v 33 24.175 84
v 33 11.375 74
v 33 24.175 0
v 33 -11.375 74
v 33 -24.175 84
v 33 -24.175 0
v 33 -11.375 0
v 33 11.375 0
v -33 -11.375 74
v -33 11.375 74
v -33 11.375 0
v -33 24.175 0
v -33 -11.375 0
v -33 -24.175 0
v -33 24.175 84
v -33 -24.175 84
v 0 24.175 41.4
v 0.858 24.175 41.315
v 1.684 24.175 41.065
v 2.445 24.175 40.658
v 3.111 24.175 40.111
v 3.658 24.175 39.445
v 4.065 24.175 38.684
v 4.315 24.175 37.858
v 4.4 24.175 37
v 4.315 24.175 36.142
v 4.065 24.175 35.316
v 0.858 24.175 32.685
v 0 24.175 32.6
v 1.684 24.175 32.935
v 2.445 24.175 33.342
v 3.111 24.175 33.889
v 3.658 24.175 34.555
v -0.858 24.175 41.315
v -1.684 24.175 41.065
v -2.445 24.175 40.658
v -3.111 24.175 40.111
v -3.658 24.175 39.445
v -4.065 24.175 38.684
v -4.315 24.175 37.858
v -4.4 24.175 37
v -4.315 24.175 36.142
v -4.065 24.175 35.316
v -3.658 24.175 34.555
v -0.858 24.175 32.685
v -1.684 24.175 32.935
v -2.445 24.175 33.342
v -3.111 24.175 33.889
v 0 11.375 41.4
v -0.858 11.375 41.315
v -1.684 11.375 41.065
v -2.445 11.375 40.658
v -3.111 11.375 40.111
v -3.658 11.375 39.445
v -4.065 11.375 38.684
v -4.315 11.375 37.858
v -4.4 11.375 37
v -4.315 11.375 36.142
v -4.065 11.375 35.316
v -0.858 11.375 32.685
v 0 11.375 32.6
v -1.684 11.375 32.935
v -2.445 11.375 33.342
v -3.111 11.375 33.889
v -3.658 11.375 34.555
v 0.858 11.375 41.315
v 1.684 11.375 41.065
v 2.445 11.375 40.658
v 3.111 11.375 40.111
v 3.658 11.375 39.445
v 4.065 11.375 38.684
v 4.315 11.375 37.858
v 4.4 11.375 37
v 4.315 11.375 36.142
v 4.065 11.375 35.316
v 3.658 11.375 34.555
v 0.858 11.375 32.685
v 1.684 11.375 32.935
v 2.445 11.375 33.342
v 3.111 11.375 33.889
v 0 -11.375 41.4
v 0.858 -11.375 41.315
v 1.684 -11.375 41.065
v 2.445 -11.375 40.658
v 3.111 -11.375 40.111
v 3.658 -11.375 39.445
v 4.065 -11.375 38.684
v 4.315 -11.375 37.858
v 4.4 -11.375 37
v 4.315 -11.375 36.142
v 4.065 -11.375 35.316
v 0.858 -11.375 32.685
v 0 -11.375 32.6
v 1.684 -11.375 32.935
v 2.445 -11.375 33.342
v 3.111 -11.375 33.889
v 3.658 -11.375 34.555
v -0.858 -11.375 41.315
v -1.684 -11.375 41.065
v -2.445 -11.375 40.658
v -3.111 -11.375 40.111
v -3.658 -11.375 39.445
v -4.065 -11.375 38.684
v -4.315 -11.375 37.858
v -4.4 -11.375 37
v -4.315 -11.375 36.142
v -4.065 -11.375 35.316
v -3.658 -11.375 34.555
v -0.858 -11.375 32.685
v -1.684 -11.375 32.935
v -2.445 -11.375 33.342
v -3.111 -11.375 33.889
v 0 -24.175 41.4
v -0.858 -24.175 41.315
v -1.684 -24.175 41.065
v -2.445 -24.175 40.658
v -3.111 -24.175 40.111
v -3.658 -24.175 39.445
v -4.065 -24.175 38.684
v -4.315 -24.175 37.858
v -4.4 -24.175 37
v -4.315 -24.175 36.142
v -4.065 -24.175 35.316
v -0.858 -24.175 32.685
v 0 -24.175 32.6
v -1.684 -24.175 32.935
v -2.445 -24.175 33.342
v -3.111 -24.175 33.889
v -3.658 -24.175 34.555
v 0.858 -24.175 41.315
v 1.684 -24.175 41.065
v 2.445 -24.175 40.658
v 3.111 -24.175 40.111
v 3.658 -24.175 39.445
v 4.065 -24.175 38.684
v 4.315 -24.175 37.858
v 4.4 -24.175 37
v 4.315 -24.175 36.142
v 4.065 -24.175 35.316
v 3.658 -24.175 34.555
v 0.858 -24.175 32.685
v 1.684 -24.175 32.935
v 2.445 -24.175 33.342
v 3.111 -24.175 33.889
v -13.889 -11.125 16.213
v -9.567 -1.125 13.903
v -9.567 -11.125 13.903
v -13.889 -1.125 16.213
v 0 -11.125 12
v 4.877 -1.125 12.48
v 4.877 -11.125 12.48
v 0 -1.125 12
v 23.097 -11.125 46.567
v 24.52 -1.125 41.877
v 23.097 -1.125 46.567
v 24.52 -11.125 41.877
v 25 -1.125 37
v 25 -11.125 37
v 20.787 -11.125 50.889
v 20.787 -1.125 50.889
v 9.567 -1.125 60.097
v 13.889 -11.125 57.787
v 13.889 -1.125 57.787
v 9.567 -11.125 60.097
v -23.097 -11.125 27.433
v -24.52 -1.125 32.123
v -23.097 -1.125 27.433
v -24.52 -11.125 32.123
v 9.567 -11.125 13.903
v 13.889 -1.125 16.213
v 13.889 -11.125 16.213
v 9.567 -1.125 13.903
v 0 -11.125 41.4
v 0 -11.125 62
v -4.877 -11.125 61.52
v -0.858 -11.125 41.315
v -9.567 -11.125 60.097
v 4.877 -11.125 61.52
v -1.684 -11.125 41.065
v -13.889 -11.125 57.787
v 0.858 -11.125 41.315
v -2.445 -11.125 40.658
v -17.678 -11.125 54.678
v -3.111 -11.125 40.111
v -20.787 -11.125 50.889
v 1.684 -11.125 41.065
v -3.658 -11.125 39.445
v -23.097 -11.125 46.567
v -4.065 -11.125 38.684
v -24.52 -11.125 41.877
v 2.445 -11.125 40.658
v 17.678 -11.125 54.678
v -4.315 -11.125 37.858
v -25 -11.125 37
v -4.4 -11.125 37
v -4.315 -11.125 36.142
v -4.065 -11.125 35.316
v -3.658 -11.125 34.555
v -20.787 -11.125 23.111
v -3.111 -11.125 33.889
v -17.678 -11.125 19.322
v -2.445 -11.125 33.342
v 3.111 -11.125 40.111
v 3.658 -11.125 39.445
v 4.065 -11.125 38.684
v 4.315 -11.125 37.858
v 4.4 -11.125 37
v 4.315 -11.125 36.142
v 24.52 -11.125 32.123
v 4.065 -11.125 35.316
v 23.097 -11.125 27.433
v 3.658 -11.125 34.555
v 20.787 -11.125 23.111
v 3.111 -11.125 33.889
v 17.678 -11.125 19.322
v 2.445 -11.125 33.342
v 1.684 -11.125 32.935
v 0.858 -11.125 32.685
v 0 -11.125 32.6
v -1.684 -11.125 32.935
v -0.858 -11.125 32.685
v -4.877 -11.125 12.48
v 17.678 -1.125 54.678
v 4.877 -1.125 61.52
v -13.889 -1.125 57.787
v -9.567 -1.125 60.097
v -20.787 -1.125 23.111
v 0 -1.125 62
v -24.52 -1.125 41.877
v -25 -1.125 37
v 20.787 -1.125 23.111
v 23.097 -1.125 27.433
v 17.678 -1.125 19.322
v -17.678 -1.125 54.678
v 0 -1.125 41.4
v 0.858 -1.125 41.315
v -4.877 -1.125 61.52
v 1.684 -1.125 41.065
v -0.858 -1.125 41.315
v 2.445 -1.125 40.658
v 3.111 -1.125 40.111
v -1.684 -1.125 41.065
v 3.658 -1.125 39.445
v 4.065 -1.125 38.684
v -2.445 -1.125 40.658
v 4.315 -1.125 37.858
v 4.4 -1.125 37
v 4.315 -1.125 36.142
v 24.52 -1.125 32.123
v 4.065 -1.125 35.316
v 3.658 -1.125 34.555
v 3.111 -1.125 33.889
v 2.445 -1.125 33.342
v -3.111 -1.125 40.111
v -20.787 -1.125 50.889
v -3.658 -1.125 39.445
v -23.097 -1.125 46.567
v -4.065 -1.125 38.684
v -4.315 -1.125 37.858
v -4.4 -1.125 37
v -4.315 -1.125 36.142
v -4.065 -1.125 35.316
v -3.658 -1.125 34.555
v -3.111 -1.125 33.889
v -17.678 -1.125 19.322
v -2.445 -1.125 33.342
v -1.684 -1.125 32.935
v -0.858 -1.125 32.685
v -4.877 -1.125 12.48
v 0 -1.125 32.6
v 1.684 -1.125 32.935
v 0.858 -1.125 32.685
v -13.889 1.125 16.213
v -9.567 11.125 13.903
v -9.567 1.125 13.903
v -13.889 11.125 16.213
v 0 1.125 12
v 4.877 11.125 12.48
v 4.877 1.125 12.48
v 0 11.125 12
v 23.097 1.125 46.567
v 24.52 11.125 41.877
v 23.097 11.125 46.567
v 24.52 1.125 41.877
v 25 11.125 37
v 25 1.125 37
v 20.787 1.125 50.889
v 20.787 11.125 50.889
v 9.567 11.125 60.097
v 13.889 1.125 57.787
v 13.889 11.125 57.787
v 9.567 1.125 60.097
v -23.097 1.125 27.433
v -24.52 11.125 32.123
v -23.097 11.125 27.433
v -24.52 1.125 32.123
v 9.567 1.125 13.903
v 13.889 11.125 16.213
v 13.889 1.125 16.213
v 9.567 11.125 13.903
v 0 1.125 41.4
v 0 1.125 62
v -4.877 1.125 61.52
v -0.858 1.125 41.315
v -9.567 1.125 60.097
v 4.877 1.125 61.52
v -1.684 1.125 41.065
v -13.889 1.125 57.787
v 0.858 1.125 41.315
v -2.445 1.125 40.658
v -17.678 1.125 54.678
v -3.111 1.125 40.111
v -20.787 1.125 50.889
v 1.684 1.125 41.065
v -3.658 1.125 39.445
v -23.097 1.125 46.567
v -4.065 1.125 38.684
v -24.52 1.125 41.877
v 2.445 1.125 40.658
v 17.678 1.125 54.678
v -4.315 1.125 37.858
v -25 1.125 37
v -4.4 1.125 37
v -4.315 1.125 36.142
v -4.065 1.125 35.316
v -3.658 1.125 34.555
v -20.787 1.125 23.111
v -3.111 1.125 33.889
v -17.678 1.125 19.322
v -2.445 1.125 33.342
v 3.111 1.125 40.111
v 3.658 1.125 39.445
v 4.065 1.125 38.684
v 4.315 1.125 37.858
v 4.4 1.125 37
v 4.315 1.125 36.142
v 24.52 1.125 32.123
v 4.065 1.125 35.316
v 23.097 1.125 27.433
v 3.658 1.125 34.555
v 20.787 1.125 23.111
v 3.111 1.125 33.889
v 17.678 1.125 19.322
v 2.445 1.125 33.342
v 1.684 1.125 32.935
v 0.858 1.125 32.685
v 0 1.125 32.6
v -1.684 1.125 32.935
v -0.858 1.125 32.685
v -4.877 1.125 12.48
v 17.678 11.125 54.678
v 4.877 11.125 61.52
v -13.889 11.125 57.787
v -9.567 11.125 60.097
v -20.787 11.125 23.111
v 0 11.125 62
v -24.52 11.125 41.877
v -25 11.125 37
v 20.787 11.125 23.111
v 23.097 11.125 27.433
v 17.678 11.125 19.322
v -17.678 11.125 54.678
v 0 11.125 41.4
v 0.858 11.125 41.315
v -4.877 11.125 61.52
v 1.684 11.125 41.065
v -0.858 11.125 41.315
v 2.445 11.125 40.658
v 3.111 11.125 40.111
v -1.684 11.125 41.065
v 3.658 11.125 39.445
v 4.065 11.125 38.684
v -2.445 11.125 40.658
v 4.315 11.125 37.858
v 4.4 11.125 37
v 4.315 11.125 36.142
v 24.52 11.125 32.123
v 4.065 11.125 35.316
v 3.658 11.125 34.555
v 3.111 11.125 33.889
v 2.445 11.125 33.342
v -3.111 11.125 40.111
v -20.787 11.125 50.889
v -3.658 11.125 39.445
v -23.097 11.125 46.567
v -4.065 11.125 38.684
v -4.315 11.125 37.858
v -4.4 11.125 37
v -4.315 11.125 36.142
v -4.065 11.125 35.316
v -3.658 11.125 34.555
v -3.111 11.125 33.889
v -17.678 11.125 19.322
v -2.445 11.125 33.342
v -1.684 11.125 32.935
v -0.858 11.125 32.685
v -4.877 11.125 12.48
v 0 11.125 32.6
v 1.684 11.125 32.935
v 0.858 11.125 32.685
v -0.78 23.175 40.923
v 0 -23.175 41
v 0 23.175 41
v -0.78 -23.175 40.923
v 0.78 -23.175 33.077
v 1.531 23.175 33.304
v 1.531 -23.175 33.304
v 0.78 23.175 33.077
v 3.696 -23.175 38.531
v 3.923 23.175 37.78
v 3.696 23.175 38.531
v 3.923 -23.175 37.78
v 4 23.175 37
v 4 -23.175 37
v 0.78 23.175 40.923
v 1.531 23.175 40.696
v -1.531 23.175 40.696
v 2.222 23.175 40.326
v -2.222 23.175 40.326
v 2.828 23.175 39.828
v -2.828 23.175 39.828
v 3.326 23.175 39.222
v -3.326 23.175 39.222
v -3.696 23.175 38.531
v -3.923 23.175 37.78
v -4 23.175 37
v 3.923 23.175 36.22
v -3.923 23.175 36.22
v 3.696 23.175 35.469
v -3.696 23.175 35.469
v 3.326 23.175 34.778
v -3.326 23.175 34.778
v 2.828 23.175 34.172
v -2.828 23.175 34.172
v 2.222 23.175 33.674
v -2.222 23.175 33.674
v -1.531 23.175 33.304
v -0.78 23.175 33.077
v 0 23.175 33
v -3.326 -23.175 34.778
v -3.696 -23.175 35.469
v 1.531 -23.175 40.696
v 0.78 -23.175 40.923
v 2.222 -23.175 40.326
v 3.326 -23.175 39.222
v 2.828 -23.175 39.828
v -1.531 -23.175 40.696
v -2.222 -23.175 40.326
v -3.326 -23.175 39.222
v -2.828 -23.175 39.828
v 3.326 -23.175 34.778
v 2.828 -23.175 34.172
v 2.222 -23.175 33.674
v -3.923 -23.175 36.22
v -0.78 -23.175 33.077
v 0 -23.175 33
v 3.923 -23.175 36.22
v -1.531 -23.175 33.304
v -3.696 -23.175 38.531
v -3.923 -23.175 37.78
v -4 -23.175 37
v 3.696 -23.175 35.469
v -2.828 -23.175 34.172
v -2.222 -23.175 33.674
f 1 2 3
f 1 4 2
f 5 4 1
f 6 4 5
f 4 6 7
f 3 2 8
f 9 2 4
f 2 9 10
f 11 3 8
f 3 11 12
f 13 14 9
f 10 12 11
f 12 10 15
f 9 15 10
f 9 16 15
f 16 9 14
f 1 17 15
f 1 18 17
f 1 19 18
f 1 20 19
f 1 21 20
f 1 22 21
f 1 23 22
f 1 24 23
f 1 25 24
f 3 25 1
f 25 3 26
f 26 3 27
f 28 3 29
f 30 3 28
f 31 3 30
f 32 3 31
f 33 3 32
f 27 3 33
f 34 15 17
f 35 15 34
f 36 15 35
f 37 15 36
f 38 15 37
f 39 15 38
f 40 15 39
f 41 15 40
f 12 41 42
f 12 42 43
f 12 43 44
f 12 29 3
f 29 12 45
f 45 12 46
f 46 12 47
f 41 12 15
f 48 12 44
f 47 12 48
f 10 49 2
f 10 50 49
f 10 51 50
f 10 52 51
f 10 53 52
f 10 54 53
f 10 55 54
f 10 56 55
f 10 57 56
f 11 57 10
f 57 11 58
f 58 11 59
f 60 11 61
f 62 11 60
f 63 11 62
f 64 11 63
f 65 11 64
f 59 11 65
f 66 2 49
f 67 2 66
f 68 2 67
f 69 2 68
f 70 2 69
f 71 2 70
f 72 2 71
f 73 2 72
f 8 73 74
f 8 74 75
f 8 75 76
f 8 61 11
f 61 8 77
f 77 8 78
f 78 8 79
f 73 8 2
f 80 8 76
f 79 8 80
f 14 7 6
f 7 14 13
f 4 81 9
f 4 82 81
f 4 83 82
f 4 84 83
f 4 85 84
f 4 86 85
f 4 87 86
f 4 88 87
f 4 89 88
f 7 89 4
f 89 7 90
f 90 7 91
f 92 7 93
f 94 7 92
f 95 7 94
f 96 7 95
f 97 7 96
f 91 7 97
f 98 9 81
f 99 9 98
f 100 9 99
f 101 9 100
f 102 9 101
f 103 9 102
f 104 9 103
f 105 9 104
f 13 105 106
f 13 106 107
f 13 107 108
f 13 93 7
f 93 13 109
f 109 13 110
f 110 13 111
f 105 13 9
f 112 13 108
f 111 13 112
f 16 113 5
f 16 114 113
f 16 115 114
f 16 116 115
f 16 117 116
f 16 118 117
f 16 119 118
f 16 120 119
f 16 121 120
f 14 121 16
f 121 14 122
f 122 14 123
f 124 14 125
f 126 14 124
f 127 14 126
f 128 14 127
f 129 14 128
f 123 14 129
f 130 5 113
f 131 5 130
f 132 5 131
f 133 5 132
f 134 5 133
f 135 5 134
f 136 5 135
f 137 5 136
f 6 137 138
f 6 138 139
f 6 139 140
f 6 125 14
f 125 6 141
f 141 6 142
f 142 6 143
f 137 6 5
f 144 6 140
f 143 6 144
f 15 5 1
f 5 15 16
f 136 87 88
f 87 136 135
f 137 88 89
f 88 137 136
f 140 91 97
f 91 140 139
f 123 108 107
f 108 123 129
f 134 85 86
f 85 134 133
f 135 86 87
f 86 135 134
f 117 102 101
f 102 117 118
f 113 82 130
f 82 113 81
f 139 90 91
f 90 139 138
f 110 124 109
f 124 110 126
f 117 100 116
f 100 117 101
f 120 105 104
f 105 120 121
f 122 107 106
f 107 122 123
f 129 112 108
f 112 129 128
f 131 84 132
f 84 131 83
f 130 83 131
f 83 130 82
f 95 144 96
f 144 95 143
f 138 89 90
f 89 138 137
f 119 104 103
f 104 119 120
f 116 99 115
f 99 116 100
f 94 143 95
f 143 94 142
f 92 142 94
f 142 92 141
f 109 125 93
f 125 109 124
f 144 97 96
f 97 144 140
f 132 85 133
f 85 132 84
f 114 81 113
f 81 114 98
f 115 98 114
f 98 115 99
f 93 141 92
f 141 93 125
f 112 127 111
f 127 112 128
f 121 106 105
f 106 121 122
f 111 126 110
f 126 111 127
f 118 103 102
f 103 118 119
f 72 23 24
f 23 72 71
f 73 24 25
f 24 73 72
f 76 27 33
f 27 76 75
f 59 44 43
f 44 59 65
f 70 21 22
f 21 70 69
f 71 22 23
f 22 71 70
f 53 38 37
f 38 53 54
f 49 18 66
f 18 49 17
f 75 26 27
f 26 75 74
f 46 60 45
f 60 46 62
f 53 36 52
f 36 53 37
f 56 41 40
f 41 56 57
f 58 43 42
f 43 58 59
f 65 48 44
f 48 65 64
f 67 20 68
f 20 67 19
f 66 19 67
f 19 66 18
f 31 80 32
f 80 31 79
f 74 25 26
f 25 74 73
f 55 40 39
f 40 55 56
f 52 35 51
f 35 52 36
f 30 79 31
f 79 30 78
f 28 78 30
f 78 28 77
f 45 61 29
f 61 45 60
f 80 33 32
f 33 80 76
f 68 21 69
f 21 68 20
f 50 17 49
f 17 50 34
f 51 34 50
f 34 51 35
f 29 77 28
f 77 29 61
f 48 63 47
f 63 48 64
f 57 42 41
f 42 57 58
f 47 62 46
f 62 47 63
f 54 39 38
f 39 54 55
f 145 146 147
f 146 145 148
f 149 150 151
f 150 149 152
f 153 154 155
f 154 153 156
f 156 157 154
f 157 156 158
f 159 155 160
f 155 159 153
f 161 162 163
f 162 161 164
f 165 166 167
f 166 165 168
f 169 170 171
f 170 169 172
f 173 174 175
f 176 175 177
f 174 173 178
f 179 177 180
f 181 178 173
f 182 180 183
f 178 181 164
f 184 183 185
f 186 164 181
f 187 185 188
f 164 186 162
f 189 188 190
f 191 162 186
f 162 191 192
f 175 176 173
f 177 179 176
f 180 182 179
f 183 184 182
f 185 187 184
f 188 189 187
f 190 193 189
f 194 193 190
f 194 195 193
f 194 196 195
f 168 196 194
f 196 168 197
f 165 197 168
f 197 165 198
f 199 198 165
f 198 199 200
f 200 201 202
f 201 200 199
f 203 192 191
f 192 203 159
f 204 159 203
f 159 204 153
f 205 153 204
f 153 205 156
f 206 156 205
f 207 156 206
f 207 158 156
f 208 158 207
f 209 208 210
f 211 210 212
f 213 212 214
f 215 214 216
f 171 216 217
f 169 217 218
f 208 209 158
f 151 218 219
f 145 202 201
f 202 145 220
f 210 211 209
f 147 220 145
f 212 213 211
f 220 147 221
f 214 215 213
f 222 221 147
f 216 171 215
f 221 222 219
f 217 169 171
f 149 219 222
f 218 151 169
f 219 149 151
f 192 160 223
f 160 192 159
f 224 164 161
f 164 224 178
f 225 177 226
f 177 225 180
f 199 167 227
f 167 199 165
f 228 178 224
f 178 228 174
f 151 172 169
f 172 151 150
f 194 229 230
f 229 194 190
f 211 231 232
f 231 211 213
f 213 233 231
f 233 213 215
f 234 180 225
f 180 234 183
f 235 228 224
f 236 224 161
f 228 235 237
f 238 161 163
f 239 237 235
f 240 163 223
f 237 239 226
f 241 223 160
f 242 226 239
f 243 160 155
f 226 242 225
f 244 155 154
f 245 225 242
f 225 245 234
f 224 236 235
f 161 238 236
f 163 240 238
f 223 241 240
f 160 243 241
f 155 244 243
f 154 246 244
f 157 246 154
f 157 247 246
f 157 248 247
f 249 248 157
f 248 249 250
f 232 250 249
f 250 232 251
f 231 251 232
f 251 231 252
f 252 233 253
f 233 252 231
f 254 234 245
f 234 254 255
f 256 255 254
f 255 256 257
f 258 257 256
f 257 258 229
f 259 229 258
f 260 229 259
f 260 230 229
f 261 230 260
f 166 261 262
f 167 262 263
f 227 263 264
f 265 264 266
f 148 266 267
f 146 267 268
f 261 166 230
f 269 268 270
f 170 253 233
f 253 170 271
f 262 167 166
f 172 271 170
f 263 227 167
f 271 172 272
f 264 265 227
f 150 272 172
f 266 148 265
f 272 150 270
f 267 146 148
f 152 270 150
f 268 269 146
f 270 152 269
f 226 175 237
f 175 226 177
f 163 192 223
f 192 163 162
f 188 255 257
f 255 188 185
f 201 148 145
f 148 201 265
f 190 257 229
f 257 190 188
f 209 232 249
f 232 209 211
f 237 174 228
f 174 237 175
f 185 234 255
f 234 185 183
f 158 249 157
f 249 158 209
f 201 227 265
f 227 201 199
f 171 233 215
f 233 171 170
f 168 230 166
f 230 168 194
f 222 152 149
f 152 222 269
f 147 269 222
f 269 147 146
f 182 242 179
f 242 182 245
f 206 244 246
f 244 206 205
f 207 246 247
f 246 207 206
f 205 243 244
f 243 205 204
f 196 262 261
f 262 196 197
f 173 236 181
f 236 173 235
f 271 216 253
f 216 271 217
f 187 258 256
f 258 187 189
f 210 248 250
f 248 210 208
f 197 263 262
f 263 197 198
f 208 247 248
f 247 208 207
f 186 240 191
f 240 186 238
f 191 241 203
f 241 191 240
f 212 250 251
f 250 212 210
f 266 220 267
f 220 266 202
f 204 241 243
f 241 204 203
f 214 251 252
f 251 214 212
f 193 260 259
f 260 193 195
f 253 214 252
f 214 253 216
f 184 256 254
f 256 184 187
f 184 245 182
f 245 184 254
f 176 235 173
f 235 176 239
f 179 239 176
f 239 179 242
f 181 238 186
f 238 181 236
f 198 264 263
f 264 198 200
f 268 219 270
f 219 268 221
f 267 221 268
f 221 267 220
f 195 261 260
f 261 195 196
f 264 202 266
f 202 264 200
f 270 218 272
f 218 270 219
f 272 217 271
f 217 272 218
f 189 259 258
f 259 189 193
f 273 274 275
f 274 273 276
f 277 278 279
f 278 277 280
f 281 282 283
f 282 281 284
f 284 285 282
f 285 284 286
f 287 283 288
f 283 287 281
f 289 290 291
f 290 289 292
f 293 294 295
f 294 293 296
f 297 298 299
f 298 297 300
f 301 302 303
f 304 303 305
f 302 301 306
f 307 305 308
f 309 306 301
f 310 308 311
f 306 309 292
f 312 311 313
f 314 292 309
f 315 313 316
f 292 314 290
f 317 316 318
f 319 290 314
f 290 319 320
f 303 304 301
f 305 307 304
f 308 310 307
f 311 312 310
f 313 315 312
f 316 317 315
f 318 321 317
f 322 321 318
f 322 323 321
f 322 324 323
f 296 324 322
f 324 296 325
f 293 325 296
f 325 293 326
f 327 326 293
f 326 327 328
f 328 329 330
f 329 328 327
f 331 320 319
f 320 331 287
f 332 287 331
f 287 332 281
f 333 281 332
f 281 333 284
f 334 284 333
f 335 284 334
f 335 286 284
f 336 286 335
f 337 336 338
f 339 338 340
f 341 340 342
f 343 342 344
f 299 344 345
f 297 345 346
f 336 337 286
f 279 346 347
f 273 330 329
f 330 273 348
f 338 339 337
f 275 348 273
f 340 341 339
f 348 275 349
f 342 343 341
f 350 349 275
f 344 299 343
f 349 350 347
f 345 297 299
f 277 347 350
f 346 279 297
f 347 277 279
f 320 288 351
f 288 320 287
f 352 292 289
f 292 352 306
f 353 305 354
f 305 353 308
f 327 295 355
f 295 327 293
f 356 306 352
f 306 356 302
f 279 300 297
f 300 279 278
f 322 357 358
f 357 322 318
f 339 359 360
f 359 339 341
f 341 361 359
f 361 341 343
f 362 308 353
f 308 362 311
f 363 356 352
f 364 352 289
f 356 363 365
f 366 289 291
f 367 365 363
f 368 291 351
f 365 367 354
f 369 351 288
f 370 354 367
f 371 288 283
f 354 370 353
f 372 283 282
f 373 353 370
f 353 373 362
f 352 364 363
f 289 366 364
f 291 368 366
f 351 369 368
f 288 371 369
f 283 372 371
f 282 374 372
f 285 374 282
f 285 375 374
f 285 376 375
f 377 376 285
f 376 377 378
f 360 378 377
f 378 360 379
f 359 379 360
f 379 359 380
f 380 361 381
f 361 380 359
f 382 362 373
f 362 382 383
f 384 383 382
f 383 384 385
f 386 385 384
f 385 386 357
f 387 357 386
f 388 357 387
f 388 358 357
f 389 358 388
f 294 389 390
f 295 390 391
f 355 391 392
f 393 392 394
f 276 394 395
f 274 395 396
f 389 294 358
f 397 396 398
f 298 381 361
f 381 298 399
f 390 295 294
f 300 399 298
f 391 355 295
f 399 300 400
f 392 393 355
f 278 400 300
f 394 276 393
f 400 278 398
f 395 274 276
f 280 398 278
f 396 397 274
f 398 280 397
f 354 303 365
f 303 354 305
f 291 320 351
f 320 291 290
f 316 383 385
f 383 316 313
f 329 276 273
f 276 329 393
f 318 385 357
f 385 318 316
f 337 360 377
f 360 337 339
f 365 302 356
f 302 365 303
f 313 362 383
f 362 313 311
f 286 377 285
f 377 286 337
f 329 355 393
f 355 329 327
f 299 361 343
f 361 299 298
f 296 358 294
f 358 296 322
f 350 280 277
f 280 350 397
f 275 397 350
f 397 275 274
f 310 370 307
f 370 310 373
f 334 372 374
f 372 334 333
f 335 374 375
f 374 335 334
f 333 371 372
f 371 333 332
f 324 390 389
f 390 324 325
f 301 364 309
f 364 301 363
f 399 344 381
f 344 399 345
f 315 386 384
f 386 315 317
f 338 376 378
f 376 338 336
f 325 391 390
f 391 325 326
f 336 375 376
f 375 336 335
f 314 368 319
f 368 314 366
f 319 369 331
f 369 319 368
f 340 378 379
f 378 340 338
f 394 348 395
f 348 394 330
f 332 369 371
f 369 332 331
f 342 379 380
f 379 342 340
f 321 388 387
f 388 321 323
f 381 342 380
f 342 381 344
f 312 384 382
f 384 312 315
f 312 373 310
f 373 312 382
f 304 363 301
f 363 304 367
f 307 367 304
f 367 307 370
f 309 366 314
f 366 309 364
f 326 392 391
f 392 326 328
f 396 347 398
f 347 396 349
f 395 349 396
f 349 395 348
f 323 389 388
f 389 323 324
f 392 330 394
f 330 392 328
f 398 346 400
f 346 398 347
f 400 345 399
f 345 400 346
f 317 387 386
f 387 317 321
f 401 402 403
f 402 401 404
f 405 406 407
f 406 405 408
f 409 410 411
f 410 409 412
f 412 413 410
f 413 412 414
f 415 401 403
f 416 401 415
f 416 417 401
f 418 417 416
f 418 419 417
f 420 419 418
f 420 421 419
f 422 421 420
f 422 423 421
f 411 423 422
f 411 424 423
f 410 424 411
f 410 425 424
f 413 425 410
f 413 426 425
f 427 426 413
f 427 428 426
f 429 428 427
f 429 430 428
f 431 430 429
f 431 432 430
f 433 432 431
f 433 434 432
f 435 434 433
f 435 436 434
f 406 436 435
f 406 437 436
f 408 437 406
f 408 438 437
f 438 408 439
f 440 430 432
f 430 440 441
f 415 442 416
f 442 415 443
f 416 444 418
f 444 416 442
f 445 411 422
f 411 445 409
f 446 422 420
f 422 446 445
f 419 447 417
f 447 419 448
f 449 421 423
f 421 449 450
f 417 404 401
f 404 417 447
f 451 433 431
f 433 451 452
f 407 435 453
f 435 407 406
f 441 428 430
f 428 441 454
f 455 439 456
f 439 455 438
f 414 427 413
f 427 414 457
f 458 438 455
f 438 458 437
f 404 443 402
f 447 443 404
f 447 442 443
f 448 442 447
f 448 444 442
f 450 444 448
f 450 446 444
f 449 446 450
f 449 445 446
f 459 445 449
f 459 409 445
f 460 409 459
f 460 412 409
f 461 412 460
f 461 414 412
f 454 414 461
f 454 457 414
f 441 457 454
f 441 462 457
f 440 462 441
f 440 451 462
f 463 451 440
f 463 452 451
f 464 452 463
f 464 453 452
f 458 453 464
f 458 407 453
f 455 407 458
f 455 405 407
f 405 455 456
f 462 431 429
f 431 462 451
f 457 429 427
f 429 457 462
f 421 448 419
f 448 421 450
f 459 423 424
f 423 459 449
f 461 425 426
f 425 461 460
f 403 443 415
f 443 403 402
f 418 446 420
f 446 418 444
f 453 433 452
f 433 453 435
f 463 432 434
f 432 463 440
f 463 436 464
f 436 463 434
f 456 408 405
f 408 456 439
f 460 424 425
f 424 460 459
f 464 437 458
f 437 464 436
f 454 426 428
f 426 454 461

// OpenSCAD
$fn = 32;

// ------------------------------------------------------------------------
// Trolley wheel set: wheels d50, fork 74 mm tall
// Every part is its own module, assembly() places every instance.
// ------------------------------------------------------------------------

// --- part 1 ---
module trolley_fork() {
  difference() {
    union() {
      translate([-33, 11.375, 0]) cube([66, 12.8, 74]);
      translate([-33, -24.175, 0]) cube([66, 12.8, 74]);
      translate([-33, -24.175, 74]) cube([66, 48.35, 10]);
    }
    translate([0, -17.775, 37]) rotate([90, 0, 0]) cylinder(h = 14.8, d = 8.8, center = true);
    translate([0, 17.775, 37]) rotate([90, 0, 0]) cylinder(h = 14.8, d = 8.8, center = true);
  }
}

// --- part 2 ---
module trolley_wheel() {
  difference() {
      translate([0, 0, 0]) cylinder(h = 10, d = 50);
      translate([0, 0, -1]) cylinder(h = 12, d = 8.8);
    }
}

// --- part 3 ---
module trolley_axle() {
  translate([0, 0, -23.175]) cylinder(h = 46.35, d = 8);
}

// --- assembly ---
module assembly() {
  color([0.80, 0.24, 0.20]) translate([0, 0, 0]) rotate([0, 0, 0]) trolley_fork();
  color([0.20, 0.45, 0.75]) translate([0, -1.125, 37]) rotate([90, 0, 0]) trolley_wheel();
  color([0.25, 0.62, 0.32]) translate([0, 11.125, 37]) rotate([90, 0, 0]) trolley_wheel();
  color([0.92, 0.70, 0.18]) translate([0, 0, 37]) rotate([90, 0, 0]) trolley_axle();
}

assembly();
